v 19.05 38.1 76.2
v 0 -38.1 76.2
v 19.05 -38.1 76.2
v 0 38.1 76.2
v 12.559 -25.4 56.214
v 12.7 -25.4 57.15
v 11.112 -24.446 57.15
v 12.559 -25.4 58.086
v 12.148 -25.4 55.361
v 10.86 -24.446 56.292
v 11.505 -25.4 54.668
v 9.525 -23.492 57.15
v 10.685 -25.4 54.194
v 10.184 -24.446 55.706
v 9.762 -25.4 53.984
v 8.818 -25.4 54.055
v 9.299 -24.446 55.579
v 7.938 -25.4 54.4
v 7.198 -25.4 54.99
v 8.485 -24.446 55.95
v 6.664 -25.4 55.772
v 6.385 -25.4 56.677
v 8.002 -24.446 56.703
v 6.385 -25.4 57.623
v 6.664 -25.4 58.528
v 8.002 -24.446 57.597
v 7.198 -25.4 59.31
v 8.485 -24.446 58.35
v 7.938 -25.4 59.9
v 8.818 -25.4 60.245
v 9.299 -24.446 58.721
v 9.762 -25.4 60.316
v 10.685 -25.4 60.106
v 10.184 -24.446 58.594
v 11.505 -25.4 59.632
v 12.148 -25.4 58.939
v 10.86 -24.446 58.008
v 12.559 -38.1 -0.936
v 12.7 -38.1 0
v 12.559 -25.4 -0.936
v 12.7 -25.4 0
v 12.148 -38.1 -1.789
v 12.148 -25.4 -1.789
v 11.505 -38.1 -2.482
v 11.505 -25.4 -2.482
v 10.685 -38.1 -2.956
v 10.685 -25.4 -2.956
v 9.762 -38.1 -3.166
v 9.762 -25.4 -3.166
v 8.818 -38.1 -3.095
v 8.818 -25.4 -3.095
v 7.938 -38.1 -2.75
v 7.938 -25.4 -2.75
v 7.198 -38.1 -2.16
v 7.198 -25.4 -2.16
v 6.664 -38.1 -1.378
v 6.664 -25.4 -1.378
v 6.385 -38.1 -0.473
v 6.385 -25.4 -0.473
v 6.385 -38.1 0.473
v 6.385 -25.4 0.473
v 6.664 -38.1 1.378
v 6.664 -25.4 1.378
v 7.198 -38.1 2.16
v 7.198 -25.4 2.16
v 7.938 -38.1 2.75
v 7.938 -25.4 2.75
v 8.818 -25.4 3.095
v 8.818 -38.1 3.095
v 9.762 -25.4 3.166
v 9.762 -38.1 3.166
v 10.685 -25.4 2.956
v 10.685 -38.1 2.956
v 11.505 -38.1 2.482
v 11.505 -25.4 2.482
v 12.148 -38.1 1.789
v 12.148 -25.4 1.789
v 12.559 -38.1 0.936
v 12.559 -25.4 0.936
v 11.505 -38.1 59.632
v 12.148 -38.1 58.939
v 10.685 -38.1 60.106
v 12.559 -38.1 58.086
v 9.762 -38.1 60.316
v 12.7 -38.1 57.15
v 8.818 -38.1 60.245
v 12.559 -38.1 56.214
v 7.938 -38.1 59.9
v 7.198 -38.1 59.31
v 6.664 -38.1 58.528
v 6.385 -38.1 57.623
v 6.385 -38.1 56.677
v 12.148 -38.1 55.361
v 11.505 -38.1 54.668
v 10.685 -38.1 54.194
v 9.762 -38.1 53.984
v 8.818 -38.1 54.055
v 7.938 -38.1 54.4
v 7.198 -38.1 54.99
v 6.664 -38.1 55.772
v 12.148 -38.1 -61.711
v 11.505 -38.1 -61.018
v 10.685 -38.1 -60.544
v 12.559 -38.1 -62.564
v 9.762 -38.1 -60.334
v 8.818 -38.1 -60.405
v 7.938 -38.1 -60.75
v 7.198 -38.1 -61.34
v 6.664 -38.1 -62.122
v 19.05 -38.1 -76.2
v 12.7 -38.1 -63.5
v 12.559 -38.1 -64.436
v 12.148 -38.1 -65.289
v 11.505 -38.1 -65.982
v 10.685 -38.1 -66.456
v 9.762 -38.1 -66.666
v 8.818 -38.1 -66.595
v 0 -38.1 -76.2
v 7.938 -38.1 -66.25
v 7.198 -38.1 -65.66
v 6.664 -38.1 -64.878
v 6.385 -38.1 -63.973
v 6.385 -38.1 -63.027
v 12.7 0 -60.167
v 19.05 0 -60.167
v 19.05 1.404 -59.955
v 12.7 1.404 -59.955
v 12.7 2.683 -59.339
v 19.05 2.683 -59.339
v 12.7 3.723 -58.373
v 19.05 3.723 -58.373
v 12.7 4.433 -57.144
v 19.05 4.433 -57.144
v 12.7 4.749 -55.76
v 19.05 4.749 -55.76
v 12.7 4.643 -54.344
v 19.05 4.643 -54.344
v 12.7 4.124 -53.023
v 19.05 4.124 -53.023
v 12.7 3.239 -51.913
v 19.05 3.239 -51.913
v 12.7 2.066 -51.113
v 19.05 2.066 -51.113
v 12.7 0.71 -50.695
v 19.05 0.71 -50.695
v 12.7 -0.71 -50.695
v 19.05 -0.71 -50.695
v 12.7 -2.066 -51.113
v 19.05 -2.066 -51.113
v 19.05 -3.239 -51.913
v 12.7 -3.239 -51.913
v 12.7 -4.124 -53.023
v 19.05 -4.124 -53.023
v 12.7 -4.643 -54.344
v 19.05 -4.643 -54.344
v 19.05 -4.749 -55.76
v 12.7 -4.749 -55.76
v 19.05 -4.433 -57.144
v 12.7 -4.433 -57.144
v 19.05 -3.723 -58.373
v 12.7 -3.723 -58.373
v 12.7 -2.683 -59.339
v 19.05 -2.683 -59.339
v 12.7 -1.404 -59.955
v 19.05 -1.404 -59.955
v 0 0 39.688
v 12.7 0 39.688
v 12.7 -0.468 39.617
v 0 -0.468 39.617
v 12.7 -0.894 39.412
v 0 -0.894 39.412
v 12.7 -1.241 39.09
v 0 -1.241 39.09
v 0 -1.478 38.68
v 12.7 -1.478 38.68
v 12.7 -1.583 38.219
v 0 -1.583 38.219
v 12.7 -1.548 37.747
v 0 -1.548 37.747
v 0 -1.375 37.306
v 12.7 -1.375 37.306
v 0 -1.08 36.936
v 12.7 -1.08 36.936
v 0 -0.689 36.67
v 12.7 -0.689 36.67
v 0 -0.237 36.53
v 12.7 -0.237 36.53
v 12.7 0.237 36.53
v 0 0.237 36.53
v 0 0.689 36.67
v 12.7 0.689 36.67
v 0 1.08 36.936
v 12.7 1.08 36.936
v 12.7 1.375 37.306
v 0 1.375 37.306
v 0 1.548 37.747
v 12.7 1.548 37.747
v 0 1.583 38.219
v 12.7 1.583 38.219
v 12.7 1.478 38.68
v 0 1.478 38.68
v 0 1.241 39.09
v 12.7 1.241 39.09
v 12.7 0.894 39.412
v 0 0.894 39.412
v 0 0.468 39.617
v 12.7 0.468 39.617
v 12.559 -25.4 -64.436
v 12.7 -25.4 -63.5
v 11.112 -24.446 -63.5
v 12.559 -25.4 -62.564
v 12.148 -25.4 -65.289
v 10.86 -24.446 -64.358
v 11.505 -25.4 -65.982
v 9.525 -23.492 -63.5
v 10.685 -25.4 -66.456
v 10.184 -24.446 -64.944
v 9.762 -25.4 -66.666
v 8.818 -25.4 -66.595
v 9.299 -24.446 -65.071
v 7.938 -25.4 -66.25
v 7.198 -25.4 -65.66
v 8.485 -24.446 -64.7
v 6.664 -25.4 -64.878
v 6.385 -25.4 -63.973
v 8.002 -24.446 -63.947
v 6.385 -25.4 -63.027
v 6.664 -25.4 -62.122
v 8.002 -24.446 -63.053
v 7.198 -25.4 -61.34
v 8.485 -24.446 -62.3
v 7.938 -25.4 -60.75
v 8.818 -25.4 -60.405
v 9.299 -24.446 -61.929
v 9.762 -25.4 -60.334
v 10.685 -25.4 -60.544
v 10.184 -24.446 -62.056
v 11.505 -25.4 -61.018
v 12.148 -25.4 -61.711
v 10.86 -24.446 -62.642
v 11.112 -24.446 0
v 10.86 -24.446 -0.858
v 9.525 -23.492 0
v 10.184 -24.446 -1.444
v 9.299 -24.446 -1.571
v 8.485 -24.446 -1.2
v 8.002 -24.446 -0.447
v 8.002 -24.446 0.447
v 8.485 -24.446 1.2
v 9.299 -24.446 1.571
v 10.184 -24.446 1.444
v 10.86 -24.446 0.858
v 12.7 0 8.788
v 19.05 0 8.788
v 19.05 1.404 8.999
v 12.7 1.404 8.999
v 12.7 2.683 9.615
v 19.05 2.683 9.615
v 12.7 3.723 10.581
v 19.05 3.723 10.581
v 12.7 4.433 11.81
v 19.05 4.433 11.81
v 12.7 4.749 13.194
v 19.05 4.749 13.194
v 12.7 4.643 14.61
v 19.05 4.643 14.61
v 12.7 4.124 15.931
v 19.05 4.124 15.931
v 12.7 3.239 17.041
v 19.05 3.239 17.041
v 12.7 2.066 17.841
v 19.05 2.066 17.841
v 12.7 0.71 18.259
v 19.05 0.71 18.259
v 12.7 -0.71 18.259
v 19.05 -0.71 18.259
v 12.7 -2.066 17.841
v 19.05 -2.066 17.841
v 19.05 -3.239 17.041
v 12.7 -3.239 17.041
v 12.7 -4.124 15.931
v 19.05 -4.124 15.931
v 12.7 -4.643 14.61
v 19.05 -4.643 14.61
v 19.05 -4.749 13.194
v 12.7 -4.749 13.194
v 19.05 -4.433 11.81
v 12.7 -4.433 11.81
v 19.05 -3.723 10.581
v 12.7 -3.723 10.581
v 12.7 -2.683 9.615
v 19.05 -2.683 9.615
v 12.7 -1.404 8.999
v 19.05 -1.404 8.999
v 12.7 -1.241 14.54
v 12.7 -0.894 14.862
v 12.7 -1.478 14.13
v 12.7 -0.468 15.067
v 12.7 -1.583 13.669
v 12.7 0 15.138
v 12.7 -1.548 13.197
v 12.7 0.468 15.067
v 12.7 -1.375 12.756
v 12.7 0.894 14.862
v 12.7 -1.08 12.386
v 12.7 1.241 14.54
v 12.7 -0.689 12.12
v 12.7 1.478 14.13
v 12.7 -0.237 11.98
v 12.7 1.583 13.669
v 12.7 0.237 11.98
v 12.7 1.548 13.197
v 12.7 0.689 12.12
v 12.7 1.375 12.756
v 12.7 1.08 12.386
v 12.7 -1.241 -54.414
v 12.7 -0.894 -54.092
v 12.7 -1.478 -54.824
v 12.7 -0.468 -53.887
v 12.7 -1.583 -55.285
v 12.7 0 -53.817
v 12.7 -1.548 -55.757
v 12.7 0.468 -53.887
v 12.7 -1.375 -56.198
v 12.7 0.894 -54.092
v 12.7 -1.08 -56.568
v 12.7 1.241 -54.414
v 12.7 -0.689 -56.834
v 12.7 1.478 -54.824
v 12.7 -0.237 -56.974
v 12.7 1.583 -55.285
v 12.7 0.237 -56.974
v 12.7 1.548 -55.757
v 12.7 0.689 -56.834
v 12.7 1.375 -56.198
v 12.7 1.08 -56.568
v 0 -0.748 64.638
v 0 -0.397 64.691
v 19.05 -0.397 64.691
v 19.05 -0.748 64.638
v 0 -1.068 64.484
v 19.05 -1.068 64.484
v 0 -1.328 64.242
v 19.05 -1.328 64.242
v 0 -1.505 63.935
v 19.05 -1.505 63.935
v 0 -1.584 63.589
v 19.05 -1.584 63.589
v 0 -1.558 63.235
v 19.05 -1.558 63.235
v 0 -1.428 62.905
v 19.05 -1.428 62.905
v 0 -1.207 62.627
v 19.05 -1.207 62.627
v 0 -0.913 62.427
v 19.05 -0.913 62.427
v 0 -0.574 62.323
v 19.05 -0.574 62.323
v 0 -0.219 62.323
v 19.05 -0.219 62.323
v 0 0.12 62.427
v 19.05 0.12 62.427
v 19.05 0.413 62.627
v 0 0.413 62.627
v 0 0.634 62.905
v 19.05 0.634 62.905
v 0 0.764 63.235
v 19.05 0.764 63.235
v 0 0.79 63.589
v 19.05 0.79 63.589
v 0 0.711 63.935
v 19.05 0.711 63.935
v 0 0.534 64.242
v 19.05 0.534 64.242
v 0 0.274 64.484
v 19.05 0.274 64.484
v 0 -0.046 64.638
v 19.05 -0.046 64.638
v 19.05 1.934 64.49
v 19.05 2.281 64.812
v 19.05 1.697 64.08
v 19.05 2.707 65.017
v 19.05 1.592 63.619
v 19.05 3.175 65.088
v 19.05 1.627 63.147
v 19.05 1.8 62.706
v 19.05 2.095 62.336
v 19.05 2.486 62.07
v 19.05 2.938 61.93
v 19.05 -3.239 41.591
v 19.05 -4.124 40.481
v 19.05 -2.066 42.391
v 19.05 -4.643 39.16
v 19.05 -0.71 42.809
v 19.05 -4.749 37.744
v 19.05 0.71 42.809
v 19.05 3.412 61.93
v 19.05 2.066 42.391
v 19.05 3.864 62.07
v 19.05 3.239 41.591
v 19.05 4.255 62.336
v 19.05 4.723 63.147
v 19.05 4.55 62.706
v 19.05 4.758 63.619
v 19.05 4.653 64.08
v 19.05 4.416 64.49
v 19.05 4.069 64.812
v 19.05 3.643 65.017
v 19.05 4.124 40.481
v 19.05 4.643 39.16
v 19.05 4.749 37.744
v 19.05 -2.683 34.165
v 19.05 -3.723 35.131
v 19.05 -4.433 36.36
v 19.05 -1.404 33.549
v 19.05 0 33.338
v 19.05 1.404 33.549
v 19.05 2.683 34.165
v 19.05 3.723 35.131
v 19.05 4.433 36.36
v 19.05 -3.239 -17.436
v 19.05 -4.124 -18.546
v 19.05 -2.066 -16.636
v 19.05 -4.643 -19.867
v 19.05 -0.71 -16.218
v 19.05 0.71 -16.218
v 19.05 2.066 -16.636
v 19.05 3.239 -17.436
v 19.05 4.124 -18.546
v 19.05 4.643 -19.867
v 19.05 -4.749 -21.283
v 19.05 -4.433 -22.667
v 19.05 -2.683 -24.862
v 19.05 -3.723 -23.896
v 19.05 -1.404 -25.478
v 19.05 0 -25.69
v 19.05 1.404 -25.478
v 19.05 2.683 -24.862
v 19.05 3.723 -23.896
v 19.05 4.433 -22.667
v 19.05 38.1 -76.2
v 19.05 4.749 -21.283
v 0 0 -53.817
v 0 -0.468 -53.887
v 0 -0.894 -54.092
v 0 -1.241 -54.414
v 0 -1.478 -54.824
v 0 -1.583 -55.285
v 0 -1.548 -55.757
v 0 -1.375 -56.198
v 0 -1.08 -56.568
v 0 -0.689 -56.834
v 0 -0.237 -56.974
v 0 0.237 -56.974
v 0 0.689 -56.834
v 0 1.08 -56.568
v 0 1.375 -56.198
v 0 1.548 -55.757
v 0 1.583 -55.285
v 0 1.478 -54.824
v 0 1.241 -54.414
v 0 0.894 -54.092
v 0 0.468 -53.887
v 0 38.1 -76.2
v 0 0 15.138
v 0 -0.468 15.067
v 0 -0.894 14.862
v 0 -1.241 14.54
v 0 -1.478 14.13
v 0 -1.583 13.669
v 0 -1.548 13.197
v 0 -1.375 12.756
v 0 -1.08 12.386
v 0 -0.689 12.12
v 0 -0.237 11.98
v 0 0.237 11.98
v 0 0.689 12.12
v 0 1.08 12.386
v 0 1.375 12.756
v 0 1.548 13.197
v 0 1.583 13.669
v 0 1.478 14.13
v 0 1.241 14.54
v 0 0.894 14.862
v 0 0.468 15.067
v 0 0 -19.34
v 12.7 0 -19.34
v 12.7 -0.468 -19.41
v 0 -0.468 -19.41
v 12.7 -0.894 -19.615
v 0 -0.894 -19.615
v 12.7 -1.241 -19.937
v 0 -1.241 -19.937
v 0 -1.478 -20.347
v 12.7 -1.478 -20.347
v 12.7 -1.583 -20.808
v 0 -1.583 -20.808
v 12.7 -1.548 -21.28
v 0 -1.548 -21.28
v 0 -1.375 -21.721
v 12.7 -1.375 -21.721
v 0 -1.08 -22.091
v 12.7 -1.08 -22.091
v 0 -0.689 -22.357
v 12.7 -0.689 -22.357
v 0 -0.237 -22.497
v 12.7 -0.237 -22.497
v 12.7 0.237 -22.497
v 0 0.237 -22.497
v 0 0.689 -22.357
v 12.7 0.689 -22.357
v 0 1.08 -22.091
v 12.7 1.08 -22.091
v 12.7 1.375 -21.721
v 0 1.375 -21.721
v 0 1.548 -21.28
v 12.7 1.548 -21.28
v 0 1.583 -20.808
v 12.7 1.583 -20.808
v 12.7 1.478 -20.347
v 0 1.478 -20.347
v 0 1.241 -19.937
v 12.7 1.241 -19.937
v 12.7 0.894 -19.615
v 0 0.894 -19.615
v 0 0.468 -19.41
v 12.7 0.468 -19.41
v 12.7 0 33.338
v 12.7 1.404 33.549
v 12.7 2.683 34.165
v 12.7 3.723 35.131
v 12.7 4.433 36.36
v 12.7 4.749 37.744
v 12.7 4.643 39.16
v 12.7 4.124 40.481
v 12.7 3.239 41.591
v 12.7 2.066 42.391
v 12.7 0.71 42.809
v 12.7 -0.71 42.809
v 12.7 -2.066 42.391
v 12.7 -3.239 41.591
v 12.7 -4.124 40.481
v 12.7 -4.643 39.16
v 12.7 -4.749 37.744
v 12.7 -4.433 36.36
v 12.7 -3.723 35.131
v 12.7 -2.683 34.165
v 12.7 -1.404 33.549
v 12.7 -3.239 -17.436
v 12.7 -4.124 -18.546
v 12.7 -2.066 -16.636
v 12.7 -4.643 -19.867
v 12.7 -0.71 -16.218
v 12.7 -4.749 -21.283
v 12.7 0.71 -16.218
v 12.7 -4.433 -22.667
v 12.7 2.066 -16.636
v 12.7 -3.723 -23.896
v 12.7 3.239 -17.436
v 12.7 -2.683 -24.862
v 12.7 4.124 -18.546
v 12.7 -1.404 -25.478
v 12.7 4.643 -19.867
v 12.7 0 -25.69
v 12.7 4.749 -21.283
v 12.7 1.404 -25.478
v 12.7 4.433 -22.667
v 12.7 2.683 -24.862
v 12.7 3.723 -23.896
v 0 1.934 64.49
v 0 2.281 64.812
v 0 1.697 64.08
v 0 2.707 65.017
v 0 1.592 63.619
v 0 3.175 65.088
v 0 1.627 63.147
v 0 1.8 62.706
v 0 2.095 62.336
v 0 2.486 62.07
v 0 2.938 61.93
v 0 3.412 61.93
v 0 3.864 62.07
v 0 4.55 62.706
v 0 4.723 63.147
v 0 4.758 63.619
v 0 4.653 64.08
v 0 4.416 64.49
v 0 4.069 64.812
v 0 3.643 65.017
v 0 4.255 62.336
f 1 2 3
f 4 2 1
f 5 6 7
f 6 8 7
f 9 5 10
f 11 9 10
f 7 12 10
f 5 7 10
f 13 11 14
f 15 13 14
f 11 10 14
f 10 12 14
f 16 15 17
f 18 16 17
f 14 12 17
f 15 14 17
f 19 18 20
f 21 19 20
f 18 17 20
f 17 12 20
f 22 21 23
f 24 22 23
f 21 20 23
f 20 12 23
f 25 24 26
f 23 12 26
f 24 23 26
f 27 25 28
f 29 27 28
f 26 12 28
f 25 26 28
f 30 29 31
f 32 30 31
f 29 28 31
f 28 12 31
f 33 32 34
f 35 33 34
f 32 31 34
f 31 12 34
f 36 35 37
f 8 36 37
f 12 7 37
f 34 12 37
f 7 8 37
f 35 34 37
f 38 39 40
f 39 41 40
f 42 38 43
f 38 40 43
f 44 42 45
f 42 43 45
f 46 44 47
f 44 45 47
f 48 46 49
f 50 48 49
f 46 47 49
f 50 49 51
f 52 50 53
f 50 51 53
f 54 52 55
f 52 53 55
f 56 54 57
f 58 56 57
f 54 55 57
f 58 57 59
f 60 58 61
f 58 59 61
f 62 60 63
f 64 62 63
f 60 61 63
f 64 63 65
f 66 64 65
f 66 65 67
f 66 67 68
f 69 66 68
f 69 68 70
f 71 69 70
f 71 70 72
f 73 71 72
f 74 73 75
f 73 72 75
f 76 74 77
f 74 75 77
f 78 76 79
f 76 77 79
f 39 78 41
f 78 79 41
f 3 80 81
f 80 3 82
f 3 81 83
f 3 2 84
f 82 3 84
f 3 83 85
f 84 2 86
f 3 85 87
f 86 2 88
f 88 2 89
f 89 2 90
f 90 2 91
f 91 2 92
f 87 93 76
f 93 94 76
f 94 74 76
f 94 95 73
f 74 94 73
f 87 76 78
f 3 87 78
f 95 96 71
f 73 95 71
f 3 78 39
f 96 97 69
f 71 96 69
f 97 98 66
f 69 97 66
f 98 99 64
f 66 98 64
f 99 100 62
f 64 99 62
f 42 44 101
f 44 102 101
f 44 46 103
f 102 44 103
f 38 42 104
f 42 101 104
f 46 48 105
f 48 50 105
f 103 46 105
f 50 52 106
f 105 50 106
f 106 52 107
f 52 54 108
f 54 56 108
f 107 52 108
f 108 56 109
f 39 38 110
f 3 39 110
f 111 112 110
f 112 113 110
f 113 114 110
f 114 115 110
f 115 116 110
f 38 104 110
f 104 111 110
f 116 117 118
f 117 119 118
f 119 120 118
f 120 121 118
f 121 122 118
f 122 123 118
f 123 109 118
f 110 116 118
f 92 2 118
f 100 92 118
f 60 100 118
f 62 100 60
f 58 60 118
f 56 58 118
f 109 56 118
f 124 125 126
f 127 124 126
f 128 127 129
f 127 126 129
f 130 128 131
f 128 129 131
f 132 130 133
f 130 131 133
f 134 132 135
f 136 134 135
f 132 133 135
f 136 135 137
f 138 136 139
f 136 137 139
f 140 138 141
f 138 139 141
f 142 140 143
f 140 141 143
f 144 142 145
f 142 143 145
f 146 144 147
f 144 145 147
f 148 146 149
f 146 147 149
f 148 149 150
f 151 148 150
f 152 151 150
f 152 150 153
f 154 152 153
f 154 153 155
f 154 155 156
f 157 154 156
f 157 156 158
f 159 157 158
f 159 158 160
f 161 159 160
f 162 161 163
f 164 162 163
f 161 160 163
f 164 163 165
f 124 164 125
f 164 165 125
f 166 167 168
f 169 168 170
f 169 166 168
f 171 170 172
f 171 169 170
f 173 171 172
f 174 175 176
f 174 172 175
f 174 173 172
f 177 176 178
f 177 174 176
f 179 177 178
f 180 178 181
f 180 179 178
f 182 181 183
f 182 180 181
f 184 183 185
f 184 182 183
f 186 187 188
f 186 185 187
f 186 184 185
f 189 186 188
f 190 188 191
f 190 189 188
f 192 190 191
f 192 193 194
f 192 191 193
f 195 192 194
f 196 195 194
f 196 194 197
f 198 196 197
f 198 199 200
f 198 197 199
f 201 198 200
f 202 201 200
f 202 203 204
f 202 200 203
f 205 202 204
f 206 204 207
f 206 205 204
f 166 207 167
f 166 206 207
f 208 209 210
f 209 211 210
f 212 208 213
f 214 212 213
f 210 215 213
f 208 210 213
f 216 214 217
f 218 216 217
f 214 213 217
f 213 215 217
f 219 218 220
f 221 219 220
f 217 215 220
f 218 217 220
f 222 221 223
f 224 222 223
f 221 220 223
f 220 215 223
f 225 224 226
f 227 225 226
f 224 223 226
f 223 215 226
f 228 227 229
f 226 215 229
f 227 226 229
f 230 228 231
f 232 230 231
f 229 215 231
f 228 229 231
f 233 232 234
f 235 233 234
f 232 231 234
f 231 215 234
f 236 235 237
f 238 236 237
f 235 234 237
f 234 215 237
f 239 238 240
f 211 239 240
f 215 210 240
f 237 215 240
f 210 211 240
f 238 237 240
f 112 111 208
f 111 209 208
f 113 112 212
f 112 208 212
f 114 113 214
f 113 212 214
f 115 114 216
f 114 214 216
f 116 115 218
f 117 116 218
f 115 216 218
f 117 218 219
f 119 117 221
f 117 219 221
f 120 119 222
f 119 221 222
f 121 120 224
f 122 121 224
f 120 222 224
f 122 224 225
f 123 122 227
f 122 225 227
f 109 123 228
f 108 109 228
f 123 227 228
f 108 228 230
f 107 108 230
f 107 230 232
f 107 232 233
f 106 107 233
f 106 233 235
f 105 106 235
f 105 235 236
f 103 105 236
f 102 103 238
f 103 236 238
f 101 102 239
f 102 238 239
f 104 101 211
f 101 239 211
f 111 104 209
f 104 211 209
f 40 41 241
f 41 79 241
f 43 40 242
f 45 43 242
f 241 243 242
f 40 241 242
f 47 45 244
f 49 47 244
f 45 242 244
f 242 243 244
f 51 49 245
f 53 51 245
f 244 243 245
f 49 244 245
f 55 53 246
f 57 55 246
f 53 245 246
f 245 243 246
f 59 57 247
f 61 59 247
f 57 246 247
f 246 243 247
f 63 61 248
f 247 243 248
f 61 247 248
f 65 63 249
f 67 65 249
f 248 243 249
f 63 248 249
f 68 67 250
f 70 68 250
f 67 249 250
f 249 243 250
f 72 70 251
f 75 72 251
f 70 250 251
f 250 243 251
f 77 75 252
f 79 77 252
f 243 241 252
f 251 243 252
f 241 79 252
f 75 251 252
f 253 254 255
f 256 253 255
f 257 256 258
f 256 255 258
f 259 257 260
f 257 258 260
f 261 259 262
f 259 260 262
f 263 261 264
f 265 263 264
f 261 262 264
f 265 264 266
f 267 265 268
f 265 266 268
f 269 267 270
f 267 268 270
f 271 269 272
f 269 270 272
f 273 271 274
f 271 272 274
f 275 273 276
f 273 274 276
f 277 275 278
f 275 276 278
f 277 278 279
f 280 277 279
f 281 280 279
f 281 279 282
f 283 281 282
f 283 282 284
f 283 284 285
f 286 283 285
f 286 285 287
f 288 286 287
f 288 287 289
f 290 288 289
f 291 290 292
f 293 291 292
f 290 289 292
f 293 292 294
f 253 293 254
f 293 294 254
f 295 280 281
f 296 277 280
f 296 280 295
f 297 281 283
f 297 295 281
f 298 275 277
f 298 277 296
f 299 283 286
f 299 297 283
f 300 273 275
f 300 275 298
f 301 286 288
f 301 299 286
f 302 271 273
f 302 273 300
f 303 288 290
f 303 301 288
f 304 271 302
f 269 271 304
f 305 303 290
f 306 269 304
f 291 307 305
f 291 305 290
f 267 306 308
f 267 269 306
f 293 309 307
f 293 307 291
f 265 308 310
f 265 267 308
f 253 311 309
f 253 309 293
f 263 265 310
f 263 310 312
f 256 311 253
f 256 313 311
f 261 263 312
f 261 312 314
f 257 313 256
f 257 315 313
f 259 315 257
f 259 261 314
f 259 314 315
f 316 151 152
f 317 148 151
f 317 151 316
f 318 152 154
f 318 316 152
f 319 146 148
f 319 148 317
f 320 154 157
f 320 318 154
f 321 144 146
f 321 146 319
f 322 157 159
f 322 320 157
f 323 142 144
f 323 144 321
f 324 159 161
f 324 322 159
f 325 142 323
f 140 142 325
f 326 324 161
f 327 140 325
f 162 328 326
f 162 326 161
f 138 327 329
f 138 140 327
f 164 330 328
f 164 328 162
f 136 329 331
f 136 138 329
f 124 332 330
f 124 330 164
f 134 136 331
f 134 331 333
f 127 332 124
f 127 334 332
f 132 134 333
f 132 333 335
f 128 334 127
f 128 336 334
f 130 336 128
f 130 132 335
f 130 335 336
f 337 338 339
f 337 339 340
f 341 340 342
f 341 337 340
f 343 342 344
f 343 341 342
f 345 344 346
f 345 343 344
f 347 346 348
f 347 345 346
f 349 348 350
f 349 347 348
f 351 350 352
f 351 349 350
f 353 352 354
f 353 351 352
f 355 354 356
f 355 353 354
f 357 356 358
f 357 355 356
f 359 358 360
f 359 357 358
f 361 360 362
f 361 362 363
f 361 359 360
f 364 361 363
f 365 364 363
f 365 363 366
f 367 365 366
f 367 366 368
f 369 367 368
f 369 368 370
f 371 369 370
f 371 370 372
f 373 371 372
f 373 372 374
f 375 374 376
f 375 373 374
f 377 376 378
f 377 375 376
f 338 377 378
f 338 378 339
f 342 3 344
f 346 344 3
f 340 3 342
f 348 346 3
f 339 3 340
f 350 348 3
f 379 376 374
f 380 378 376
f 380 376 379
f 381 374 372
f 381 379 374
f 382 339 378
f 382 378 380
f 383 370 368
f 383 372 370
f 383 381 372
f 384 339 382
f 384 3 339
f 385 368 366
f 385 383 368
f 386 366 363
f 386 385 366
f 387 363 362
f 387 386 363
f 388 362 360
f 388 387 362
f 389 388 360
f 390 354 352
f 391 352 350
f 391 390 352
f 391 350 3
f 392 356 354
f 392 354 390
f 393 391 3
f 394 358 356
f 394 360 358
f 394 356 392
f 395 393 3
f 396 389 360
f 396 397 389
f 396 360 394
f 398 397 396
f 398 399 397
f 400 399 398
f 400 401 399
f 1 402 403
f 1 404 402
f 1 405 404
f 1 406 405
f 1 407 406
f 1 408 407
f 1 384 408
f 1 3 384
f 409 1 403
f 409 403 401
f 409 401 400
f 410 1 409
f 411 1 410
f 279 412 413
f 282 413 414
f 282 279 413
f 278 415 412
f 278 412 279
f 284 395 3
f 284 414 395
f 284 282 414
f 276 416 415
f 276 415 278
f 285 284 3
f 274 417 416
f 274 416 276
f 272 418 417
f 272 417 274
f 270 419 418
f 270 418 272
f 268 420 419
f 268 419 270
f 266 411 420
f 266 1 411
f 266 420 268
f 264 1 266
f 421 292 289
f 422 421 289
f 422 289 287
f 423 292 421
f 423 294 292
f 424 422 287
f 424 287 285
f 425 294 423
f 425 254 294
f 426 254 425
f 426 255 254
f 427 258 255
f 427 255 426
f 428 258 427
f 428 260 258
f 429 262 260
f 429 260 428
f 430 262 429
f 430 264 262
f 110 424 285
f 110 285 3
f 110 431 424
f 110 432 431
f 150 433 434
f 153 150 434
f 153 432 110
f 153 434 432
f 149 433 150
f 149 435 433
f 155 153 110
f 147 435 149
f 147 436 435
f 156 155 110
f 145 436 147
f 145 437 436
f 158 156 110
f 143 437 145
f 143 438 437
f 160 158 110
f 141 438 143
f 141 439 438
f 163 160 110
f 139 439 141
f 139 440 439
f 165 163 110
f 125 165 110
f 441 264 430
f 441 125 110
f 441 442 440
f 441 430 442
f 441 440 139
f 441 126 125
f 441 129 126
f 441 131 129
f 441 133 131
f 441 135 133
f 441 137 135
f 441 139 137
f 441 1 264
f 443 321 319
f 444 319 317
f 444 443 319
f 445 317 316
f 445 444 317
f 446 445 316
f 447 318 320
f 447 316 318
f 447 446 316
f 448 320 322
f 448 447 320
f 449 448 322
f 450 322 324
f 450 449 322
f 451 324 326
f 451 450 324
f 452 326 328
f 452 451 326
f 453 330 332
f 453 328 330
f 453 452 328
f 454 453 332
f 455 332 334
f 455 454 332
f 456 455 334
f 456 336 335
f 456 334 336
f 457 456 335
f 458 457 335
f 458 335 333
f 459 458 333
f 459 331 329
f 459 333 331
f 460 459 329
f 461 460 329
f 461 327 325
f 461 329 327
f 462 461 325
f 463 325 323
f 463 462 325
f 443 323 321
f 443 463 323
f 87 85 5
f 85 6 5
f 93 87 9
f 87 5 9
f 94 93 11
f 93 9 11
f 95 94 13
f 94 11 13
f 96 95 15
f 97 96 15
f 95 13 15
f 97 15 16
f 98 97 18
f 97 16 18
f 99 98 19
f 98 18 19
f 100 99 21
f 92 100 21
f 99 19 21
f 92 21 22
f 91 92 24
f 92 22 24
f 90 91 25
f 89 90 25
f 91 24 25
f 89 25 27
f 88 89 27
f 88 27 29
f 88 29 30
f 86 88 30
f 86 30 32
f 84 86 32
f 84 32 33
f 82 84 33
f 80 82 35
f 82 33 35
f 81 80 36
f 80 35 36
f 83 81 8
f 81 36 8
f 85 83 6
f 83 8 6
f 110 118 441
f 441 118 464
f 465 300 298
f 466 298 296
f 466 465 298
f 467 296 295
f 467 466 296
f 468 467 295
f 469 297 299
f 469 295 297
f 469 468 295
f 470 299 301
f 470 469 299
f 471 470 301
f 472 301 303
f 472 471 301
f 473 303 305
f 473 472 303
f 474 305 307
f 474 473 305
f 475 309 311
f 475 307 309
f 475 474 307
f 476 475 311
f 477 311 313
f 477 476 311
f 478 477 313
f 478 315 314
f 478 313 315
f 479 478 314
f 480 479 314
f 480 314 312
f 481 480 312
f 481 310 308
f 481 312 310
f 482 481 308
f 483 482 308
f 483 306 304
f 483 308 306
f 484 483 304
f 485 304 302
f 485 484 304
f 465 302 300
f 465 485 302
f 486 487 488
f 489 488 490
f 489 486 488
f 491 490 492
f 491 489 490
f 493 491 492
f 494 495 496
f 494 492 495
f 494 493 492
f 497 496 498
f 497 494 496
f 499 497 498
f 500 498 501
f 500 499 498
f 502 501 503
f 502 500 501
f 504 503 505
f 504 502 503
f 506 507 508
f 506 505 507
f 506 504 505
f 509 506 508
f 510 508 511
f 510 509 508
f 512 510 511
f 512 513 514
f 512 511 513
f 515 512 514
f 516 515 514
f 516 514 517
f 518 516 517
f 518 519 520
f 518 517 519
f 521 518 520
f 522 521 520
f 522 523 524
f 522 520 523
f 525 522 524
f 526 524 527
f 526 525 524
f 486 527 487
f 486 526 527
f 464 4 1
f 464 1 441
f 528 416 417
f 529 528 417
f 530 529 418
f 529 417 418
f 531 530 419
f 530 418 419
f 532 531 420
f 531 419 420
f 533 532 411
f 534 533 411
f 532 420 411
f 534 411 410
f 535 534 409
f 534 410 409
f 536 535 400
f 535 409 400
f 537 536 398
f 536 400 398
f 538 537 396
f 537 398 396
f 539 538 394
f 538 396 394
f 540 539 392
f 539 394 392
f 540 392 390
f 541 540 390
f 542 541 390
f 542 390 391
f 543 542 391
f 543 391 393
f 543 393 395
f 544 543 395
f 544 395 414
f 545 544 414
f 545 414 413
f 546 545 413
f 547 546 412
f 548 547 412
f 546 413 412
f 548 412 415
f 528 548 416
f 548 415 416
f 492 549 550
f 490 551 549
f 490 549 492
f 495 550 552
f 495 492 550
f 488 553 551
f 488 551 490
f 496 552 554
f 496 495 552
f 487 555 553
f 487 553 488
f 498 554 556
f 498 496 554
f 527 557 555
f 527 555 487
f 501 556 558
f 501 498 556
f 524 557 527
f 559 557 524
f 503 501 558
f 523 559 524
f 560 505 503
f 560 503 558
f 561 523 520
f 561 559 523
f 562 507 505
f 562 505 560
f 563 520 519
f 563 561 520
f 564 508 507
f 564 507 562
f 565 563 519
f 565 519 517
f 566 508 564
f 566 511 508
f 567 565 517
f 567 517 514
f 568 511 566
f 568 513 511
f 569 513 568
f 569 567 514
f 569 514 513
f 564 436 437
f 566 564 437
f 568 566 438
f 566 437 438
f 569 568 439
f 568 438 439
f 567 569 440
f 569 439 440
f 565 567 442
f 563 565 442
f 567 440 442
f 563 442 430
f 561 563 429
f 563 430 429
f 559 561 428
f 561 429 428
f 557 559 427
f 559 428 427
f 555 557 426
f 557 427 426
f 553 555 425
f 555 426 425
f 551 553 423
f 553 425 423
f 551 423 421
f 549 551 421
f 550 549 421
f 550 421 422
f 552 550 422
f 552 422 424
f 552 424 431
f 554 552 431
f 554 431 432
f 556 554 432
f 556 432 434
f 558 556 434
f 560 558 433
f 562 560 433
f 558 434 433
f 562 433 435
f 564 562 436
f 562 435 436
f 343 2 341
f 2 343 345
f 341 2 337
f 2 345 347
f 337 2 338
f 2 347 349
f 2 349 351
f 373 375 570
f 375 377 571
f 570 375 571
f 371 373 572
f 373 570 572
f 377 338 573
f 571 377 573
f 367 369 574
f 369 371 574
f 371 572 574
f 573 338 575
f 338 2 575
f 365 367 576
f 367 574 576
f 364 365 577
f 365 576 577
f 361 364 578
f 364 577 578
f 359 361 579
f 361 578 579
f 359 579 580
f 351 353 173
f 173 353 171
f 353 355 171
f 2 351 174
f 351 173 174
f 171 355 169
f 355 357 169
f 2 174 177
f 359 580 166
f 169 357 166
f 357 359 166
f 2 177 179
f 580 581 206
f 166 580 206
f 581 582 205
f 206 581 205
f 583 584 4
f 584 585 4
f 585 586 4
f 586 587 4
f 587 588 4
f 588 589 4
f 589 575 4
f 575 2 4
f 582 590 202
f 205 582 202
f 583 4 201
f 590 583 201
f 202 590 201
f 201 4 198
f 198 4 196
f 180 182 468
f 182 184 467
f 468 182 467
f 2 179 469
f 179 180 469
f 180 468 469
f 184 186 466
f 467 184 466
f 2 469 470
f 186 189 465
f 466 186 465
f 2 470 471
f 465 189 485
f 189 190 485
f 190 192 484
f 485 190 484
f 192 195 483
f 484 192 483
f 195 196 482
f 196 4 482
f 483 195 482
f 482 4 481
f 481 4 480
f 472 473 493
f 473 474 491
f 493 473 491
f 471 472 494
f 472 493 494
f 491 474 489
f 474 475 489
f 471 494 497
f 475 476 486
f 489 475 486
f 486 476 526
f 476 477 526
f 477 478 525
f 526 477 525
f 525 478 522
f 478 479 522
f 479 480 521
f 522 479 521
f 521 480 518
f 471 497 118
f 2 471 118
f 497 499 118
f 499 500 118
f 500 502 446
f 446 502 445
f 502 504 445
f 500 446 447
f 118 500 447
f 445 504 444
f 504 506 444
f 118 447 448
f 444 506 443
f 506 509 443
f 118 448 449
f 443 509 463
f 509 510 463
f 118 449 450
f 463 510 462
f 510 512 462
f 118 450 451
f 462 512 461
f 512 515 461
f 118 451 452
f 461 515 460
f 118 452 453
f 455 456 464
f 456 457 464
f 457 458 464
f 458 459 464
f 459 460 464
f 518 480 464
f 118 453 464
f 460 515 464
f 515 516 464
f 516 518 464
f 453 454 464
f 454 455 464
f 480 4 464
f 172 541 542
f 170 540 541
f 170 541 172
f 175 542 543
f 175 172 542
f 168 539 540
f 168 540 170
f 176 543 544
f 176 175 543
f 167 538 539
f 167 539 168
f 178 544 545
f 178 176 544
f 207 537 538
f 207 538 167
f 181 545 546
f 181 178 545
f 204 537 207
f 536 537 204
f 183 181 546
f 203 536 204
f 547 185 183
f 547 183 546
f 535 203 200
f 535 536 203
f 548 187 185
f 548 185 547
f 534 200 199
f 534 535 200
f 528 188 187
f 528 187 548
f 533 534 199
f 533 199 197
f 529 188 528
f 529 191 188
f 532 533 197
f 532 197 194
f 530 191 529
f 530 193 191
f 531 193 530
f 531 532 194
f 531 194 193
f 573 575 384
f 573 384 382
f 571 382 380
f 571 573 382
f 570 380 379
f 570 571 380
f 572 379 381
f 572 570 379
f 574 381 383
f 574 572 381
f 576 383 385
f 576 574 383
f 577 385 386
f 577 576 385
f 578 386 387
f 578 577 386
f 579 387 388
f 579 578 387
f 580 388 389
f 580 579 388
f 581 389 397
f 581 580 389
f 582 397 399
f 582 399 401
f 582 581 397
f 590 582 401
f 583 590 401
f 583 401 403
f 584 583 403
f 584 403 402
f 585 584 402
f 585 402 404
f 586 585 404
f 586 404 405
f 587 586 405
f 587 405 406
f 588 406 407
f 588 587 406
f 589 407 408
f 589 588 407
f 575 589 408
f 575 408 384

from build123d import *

# Parameters (mm, degrees)
SKETCH1_W           = 152.4
SKETCH1_H           = 76.2
SKETCH1_R           = 1.5875
SKETCH1_R_2         = 1.190625
BOSS_EXTRUDE1_DEPTH = 19.05
SKETCH3_R           = 4.7625
CUT_EXTRUDE2_DEPTH  = 6.35


with BuildPart() as part:
    # Sketch1 → Boss-Extrude1 (new body)
    with BuildSketch(Plane(origin=(0, 0, 0), x_dir=(0, 0, -1), z_dir=(1, 0, 0))):
        Rectangle(SKETCH1_W, SKETCH1_H)
        with Locations(Location((-38.1, 0, 0), (0, 0, 180))):
            Circle(SKETCH1_R, mode=Mode.SUBTRACT)
        with Locations(Location((-13.55, 0, 0), (0, 0, 180))):
            Circle(SKETCH1_R, mode=Mode.SUBTRACT)
        with Locations(Location((20.927, 0, 0), (0, 0, 180))):
            Circle(SKETCH1_R, mode=Mode.SUBTRACT)
        with Locations(Location((55.404, 0, 0), (0, 0, 180))):
            Circle(SKETCH1_R, mode=Mode.SUBTRACT)
        with Locations(Location((-63.5, -0.396875, 0), (0, 0, 180))):
            Circle(SKETCH1_R_2, mode=Mode.SUBTRACT)
        with Locations(Location((-63.5, 3.175, 0), (0, 0, 180))):
            Circle(SKETCH1_R, mode=Mode.SUBTRACT)
    extrude(amount=BOSS_EXTRUDE1_DEPTH)

    # Sketch3 → Cut-Extrude2 (cut)
    with BuildSketch(Plane(origin=(19.05, 0, 0), x_dir=(0, 0, -1), z_dir=(1, 0, 0))):
        with Locations((-38.1, 0)):
            Circle(SKETCH3_R)
        with Locations((-13.55, 0)):
            Circle(SKETCH3_R)
        with Locations((20.927, 0)):
            Circle(SKETCH3_R)
        with Locations((55.404, 0)):
            Circle(SKETCH3_R)
    extrude(amount=-CUT_EXTRUDE2_DEPTH, mode=Mode.SUBTRACT)

    # 1/4 (0.25) Diameter Hole1: read off the stored shape, not the designer's step
    # 1/4 (0.25) Diameter Hole1 outline → 1/4 (0.25) Diameter Hole1 (revolve, cut)
    with BuildSketch(Plane(origin=(9.525, 0, 57.15), x_dir=(1, 0, 0), z_dir=(0, 0, 1))):
        Polygon((3.175, -25.4), (0, -23.492267535), (0, -38.1), (3.175, -38.1), align=None)
    revolve(axis=Axis((9.525, 0, 57.15), (0, 1, 0)), mode=Mode.SUBTRACT)

    # 1_4 _0.25_ Diameter Hole1 2 outline → 1_4 _0.25_ Diameter Hole1 2 (revolve, cut)
    with BuildSketch(Plane(origin=(9.525, 0, 0), x_dir=(1, 0, 0), z_dir=(0, 0, 1))):
        Polygon((3.175, -25.4), (0, -23.492267535), (0, -38.1), (3.175, -38.1), align=None)
    revolve(axis=Axis((9.525, 0, 0), (0, 1, 0)), mode=Mode.SUBTRACT)

    # 1_4 _0.25_ Diameter Hole1 3 outline → 1_4 _0.25_ Diameter Hole1 3 (revolve, cut)
    with BuildSketch(Plane(origin=(9.525, 0, -63.5), x_dir=(1, 0, 0), z_dir=(0, 0, 1))):
        Polygon((3.175, -25.4), (0, -23.492267535), (0, -38.1), (3.175, -38.1), align=None)
    revolve(axis=Axis((9.525, 0, -63.5), (0, 1, 0)), mode=Mode.SUBTRACT)


solid = part.part
